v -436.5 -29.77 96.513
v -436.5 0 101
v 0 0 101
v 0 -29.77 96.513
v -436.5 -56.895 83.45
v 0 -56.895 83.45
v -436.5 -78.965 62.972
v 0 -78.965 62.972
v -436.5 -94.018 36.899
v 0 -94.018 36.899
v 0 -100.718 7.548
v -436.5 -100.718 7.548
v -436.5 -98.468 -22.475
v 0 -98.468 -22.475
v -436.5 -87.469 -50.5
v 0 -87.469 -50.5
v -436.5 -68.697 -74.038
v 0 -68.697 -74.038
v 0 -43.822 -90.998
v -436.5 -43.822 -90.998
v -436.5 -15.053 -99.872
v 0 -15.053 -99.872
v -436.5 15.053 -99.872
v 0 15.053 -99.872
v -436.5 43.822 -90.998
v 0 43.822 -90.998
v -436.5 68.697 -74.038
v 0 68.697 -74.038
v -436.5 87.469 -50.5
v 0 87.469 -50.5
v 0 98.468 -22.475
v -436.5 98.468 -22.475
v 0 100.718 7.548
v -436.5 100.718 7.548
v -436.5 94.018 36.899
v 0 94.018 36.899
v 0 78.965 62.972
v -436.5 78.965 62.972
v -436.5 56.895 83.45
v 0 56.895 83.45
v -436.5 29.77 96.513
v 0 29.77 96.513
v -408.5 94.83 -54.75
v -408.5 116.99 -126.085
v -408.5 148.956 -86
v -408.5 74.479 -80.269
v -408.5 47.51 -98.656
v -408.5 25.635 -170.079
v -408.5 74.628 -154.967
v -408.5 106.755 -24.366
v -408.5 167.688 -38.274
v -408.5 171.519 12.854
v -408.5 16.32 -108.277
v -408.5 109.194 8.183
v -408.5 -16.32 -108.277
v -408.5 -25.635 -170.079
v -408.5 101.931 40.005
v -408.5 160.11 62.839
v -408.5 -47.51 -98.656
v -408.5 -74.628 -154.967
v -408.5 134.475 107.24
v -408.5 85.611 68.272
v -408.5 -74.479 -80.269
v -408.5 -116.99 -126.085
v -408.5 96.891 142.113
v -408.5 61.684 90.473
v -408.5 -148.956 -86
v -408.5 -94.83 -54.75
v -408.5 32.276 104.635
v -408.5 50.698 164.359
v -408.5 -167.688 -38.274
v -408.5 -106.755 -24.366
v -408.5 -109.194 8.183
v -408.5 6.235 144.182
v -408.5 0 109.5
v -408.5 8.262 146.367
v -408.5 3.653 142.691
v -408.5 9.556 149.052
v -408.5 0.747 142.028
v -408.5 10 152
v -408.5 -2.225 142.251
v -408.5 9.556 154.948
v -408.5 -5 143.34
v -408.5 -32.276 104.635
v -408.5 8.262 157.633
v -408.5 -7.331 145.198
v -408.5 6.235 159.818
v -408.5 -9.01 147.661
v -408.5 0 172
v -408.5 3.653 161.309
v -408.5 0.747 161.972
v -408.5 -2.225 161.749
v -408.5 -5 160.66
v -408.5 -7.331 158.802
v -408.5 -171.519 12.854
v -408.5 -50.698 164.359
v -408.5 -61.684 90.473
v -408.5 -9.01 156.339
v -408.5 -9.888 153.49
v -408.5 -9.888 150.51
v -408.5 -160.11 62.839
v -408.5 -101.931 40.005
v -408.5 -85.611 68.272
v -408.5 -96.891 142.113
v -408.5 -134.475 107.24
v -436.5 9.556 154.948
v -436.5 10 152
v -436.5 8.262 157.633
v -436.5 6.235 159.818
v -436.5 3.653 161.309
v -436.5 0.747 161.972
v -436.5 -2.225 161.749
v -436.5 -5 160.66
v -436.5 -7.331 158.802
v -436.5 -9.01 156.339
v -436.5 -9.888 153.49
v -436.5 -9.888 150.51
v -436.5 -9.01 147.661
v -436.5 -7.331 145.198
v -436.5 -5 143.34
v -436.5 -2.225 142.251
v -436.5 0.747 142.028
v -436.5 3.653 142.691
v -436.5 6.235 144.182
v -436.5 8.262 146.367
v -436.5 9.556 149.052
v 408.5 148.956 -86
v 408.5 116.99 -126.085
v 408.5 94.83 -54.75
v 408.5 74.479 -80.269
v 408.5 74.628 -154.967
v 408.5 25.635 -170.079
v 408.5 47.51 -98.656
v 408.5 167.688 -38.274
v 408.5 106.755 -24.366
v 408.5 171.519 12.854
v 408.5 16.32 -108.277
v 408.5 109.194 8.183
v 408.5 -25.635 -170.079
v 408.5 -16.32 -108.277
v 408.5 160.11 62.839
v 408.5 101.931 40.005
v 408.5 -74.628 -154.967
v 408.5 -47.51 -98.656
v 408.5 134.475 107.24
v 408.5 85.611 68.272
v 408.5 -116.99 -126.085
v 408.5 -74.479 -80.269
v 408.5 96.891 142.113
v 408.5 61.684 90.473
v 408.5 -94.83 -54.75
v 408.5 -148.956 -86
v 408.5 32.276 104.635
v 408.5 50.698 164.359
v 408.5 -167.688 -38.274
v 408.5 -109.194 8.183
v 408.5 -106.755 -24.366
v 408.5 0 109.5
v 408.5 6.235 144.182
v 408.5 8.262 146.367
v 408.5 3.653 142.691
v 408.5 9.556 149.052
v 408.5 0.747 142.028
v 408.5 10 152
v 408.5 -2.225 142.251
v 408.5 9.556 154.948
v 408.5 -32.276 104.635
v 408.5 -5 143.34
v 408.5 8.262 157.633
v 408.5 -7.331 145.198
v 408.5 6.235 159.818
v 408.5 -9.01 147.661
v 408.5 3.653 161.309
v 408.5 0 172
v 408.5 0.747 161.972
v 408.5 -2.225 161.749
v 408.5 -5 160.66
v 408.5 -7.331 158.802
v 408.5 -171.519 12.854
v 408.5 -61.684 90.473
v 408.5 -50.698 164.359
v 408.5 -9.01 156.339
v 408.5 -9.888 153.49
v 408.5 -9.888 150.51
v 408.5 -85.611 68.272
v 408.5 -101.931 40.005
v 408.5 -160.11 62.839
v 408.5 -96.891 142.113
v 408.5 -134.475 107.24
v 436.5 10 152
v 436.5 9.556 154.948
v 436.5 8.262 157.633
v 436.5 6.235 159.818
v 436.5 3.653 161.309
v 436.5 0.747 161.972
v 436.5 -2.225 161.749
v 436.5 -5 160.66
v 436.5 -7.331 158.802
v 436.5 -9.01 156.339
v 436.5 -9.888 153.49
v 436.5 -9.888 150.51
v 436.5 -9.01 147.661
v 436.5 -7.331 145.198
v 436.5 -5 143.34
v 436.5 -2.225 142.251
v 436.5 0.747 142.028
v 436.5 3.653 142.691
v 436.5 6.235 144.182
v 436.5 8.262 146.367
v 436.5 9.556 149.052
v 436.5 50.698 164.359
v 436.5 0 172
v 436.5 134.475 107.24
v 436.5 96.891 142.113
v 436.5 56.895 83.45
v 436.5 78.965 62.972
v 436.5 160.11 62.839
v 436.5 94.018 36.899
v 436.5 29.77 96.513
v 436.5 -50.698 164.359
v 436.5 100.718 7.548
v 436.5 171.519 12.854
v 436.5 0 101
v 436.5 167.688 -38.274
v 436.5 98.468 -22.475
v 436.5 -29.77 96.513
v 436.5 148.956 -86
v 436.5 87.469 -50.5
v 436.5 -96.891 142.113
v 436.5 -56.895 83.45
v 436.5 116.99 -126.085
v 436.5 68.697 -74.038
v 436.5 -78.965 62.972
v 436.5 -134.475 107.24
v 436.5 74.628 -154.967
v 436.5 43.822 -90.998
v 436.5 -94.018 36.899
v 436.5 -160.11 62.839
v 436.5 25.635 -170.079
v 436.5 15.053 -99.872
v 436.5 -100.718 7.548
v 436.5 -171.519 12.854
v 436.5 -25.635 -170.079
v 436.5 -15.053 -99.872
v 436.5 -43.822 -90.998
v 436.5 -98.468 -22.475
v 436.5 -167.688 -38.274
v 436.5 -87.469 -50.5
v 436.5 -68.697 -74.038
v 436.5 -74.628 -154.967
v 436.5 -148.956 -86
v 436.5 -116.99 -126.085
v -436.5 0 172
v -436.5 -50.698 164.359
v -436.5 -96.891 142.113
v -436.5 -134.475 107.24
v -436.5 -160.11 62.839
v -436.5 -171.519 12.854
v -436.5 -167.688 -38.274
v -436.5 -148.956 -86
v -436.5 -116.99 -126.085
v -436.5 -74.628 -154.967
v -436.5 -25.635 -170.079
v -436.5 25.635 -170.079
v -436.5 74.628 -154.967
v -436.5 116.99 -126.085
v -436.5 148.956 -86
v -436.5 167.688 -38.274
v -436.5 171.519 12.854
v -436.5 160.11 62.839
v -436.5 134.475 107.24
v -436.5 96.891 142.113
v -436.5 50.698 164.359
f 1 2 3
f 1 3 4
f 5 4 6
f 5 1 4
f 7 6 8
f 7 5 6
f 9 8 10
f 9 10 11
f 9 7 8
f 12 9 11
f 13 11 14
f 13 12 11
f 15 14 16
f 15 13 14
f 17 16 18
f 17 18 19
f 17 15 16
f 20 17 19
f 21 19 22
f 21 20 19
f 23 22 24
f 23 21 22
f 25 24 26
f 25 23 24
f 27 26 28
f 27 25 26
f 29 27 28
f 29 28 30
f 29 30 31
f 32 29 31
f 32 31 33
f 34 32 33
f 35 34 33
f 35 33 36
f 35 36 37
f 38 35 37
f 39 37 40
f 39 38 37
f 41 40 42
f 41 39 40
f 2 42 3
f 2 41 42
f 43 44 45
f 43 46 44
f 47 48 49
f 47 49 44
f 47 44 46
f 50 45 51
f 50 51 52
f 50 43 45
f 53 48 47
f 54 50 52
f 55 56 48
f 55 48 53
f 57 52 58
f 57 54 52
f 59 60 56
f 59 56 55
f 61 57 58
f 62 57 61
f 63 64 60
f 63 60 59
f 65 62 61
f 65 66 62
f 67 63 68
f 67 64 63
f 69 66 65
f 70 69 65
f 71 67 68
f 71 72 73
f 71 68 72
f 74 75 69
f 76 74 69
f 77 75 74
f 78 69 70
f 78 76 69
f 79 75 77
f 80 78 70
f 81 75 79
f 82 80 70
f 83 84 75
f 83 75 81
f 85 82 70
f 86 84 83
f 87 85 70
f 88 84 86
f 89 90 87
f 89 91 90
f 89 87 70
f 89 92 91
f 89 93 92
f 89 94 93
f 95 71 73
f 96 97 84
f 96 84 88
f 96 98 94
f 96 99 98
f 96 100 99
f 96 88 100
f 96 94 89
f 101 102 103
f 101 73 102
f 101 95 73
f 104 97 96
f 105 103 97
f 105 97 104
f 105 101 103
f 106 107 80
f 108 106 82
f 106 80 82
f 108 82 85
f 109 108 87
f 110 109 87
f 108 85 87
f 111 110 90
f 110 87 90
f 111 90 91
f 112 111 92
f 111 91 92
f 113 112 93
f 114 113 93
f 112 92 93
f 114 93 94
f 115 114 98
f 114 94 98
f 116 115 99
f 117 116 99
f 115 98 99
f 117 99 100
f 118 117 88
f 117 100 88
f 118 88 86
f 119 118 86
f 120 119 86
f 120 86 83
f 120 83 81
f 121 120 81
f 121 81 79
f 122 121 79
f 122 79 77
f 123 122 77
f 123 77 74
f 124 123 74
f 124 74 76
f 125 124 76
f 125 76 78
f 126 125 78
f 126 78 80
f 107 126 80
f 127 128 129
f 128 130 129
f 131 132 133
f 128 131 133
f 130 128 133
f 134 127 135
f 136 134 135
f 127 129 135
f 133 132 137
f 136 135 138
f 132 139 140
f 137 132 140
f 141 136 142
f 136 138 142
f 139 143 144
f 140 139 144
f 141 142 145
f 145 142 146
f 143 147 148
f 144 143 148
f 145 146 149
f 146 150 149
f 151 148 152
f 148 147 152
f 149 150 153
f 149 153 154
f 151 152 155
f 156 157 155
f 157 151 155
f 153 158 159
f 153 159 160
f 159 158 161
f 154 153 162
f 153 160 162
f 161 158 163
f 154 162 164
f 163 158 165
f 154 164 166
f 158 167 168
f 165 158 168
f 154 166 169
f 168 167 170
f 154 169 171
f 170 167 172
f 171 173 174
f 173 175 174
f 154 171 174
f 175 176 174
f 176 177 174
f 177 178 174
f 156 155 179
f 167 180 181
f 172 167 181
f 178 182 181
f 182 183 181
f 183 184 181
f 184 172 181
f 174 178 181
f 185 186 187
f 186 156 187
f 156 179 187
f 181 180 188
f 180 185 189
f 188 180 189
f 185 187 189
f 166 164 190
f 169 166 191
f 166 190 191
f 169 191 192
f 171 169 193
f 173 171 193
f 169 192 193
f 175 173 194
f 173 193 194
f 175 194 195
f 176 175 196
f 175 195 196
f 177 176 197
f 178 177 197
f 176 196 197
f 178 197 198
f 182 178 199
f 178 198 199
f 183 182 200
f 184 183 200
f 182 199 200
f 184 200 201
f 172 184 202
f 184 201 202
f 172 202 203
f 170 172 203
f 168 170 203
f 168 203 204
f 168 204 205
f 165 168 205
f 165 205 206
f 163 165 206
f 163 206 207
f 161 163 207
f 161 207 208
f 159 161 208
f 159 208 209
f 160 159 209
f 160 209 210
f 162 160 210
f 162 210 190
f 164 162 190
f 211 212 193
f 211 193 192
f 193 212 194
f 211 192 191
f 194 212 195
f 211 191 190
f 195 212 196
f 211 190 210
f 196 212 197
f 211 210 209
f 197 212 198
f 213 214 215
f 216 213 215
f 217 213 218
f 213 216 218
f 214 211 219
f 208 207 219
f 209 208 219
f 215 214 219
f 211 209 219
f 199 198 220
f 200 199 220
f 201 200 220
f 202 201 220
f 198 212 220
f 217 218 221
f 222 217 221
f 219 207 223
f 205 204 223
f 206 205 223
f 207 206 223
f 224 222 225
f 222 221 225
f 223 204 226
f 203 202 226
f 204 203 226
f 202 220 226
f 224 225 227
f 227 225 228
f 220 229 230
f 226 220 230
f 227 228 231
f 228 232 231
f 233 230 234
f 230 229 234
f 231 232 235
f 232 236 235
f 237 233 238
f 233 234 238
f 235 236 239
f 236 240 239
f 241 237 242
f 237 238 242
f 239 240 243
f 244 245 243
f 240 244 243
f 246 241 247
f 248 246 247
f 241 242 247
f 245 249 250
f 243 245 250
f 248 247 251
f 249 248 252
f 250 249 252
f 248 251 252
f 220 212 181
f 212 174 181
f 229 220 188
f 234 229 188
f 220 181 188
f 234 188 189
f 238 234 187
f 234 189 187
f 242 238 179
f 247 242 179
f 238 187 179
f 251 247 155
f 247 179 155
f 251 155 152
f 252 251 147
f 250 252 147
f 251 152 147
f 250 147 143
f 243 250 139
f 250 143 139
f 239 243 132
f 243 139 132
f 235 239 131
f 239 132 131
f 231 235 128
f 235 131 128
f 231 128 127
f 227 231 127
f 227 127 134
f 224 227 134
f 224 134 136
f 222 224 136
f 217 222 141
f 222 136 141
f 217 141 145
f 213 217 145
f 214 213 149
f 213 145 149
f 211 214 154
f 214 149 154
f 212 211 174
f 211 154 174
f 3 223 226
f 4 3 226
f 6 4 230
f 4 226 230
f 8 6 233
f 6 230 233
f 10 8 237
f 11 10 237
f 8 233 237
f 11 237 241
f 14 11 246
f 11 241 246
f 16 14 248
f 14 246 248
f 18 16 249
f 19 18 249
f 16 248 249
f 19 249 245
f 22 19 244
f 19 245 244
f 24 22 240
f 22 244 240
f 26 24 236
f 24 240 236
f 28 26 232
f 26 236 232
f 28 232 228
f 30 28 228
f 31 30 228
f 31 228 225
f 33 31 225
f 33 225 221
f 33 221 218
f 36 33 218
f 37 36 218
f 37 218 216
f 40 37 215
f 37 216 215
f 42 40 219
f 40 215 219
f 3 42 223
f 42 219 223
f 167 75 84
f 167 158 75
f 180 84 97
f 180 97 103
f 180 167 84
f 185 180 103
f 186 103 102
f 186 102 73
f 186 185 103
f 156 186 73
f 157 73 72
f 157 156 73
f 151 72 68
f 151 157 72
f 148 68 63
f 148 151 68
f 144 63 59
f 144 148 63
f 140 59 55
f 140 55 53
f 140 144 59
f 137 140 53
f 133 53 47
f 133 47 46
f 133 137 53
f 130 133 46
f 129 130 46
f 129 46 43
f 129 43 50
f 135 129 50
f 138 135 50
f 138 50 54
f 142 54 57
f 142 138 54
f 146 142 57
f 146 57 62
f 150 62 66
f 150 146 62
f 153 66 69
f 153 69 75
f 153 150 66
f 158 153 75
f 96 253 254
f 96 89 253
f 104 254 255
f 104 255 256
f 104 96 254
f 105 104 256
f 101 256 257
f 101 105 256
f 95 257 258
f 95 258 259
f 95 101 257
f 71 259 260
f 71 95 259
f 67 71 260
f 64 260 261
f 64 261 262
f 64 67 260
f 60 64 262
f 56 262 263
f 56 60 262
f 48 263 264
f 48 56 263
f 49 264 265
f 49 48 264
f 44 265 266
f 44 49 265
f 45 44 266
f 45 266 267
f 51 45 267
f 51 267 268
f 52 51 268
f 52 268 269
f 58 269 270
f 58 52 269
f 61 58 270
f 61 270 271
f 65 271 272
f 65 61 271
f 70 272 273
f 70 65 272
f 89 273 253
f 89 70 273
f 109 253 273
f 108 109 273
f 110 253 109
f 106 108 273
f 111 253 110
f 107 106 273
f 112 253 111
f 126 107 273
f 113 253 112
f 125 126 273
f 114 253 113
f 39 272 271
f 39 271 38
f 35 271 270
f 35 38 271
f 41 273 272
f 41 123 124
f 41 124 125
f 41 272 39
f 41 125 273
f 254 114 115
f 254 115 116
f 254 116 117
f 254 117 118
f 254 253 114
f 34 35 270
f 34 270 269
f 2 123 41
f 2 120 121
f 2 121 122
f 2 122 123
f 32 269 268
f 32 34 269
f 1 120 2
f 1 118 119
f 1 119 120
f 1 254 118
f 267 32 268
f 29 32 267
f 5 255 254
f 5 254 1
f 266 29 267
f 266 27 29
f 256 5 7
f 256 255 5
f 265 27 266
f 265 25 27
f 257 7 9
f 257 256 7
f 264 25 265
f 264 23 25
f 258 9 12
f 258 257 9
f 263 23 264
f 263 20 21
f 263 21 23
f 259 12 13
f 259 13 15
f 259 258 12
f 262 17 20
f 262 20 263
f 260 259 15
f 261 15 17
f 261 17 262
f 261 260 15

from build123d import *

# Parameters (mm, degrees)
F3_R     = 10
F4_DEPTH = 873.001


with BuildPart() as f1:
    # F0 (on Front) → F1 (revolve)
    with BuildSketch(Plane.XZ):
        Polygon((408.5, 109.5), (0, 109.5), (0, 101), (436.5, 101), (436.5, 172), (408.5, 172), align=None)
    revolve(axis=Axis((75.477585, 0, 0), (1, 0, 0)))

    # F2: F1 across plane


with BuildPart() as f1_1:
    add(f1.part)
    add(f1.part.mirror(Plane.YZ))

    # F3 (on face) → F4 (cut, through all)
    with BuildSketch(Plane.YZ.offset(436.5)):
        with Locations((0, 152)):
            Circle(F3_R)
    extrude(amount=-F4_DEPTH, mode=Mode.SUBTRACT)


solid = f1_1.part
